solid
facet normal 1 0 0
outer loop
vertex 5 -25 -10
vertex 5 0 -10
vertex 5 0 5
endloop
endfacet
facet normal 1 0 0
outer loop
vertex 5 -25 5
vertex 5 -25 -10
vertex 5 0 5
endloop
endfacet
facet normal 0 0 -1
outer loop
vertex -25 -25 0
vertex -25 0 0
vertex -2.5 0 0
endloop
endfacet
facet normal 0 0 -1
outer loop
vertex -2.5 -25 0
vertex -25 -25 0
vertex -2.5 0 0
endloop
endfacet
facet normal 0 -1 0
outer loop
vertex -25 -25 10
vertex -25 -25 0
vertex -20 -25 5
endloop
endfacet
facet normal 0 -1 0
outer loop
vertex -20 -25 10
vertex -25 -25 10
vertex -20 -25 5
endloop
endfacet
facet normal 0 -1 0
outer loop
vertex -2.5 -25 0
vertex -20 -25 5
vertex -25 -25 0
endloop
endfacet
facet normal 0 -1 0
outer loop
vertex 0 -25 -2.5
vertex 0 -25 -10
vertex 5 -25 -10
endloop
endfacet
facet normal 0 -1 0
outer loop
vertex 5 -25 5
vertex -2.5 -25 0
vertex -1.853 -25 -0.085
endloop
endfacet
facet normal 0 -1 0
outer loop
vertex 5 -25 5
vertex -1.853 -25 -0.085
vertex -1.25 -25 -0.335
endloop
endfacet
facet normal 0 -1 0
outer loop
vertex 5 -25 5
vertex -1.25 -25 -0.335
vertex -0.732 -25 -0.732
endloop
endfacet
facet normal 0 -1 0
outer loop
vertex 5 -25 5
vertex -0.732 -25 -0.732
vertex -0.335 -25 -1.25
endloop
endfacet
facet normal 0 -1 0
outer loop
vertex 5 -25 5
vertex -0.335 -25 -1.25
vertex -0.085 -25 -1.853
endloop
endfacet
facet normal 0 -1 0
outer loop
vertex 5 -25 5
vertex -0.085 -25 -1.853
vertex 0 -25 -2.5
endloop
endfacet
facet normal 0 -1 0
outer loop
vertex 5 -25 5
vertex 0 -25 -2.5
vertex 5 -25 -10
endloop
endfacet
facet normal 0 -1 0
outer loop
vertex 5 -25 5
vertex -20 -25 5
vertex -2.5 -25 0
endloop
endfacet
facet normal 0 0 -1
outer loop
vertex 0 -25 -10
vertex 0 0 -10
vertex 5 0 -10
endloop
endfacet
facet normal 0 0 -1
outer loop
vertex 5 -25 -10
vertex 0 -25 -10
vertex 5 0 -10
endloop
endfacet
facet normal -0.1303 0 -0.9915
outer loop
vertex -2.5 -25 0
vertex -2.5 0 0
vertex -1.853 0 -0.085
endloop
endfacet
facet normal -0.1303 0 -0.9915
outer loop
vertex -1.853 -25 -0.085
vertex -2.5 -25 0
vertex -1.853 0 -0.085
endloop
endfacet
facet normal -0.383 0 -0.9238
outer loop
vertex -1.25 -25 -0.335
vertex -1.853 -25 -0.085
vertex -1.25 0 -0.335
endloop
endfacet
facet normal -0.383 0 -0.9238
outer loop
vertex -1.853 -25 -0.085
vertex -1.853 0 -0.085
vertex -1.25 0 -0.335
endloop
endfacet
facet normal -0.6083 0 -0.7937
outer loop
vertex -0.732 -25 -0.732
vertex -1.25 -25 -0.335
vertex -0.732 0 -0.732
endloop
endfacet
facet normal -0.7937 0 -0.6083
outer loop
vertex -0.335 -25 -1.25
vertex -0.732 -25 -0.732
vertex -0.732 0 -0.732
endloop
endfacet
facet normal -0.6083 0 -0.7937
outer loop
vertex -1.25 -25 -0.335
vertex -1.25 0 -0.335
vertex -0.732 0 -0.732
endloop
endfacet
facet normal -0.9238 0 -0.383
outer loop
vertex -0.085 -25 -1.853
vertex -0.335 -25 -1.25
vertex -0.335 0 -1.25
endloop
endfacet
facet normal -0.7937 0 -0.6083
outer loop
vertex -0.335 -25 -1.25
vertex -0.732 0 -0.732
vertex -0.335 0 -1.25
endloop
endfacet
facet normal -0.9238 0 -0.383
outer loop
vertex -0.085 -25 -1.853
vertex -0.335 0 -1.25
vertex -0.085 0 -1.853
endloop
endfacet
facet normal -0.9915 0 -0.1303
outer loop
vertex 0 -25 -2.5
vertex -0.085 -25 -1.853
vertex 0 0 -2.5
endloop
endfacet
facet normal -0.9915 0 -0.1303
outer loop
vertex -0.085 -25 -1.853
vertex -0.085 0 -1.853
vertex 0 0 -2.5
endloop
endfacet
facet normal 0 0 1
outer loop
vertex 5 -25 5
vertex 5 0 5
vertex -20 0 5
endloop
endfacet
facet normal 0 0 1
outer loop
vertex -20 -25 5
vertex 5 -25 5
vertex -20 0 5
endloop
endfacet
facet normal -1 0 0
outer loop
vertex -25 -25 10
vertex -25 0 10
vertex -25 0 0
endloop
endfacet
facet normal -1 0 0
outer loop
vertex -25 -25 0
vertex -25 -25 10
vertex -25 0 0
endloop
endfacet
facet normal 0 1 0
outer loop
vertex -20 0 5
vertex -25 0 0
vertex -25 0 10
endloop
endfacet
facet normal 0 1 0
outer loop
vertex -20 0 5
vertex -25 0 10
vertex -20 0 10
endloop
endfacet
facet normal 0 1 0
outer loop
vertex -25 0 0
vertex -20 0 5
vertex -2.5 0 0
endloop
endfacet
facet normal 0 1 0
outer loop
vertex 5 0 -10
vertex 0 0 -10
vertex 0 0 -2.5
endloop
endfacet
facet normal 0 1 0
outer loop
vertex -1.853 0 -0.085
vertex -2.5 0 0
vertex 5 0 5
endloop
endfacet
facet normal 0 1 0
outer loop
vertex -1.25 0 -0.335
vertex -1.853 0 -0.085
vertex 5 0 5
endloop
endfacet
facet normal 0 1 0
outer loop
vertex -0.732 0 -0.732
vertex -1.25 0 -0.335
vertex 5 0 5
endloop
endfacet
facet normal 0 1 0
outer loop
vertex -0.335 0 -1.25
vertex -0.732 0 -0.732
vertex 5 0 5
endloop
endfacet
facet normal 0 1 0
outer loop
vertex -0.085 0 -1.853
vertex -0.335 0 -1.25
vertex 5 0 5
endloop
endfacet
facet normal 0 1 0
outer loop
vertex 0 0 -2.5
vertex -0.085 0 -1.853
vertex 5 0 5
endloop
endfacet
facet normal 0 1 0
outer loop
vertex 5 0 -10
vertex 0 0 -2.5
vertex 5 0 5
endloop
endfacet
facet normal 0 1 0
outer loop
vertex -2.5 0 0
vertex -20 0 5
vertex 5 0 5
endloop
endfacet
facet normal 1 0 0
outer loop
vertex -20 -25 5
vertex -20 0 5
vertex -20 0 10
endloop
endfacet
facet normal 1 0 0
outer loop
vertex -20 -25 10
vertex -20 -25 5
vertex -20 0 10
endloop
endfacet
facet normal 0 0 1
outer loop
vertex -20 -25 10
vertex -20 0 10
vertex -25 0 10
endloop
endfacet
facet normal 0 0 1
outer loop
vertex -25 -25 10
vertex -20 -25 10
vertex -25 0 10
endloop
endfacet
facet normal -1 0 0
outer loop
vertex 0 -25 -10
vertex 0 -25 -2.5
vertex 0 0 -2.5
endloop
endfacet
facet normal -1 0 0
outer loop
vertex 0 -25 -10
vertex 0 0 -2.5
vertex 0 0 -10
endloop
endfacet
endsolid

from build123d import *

# Parameters (mm, degrees)
F1_DEPTH = 25


with BuildPart() as f1:
    # F0 (on Front) → F1 (new body)
    with BuildSketch(Plane.XZ):
        with BuildLine():
            Line((-2.626851, 0), (-2.5, 0))
            ThreePointArc((-2.5, 0), (-0.732233, -0.732233), (0, -2.5))
            Line((0, -2.5), (0, -10))
            Line((0, -10), (5, -10))
            Line((5, -10), (5, 5))
            Line((5, 5), (-20, 5))
            Line((-20, 5), (-20, 10))
            Line((-20, 10), (-25, 10))
            Line((-25, 10), (-25, 0))
            Line((-25, 0), (-2.626851, 0))
        make_face()
    extrude(amount=F1_DEPTH)


solid = f1.part
